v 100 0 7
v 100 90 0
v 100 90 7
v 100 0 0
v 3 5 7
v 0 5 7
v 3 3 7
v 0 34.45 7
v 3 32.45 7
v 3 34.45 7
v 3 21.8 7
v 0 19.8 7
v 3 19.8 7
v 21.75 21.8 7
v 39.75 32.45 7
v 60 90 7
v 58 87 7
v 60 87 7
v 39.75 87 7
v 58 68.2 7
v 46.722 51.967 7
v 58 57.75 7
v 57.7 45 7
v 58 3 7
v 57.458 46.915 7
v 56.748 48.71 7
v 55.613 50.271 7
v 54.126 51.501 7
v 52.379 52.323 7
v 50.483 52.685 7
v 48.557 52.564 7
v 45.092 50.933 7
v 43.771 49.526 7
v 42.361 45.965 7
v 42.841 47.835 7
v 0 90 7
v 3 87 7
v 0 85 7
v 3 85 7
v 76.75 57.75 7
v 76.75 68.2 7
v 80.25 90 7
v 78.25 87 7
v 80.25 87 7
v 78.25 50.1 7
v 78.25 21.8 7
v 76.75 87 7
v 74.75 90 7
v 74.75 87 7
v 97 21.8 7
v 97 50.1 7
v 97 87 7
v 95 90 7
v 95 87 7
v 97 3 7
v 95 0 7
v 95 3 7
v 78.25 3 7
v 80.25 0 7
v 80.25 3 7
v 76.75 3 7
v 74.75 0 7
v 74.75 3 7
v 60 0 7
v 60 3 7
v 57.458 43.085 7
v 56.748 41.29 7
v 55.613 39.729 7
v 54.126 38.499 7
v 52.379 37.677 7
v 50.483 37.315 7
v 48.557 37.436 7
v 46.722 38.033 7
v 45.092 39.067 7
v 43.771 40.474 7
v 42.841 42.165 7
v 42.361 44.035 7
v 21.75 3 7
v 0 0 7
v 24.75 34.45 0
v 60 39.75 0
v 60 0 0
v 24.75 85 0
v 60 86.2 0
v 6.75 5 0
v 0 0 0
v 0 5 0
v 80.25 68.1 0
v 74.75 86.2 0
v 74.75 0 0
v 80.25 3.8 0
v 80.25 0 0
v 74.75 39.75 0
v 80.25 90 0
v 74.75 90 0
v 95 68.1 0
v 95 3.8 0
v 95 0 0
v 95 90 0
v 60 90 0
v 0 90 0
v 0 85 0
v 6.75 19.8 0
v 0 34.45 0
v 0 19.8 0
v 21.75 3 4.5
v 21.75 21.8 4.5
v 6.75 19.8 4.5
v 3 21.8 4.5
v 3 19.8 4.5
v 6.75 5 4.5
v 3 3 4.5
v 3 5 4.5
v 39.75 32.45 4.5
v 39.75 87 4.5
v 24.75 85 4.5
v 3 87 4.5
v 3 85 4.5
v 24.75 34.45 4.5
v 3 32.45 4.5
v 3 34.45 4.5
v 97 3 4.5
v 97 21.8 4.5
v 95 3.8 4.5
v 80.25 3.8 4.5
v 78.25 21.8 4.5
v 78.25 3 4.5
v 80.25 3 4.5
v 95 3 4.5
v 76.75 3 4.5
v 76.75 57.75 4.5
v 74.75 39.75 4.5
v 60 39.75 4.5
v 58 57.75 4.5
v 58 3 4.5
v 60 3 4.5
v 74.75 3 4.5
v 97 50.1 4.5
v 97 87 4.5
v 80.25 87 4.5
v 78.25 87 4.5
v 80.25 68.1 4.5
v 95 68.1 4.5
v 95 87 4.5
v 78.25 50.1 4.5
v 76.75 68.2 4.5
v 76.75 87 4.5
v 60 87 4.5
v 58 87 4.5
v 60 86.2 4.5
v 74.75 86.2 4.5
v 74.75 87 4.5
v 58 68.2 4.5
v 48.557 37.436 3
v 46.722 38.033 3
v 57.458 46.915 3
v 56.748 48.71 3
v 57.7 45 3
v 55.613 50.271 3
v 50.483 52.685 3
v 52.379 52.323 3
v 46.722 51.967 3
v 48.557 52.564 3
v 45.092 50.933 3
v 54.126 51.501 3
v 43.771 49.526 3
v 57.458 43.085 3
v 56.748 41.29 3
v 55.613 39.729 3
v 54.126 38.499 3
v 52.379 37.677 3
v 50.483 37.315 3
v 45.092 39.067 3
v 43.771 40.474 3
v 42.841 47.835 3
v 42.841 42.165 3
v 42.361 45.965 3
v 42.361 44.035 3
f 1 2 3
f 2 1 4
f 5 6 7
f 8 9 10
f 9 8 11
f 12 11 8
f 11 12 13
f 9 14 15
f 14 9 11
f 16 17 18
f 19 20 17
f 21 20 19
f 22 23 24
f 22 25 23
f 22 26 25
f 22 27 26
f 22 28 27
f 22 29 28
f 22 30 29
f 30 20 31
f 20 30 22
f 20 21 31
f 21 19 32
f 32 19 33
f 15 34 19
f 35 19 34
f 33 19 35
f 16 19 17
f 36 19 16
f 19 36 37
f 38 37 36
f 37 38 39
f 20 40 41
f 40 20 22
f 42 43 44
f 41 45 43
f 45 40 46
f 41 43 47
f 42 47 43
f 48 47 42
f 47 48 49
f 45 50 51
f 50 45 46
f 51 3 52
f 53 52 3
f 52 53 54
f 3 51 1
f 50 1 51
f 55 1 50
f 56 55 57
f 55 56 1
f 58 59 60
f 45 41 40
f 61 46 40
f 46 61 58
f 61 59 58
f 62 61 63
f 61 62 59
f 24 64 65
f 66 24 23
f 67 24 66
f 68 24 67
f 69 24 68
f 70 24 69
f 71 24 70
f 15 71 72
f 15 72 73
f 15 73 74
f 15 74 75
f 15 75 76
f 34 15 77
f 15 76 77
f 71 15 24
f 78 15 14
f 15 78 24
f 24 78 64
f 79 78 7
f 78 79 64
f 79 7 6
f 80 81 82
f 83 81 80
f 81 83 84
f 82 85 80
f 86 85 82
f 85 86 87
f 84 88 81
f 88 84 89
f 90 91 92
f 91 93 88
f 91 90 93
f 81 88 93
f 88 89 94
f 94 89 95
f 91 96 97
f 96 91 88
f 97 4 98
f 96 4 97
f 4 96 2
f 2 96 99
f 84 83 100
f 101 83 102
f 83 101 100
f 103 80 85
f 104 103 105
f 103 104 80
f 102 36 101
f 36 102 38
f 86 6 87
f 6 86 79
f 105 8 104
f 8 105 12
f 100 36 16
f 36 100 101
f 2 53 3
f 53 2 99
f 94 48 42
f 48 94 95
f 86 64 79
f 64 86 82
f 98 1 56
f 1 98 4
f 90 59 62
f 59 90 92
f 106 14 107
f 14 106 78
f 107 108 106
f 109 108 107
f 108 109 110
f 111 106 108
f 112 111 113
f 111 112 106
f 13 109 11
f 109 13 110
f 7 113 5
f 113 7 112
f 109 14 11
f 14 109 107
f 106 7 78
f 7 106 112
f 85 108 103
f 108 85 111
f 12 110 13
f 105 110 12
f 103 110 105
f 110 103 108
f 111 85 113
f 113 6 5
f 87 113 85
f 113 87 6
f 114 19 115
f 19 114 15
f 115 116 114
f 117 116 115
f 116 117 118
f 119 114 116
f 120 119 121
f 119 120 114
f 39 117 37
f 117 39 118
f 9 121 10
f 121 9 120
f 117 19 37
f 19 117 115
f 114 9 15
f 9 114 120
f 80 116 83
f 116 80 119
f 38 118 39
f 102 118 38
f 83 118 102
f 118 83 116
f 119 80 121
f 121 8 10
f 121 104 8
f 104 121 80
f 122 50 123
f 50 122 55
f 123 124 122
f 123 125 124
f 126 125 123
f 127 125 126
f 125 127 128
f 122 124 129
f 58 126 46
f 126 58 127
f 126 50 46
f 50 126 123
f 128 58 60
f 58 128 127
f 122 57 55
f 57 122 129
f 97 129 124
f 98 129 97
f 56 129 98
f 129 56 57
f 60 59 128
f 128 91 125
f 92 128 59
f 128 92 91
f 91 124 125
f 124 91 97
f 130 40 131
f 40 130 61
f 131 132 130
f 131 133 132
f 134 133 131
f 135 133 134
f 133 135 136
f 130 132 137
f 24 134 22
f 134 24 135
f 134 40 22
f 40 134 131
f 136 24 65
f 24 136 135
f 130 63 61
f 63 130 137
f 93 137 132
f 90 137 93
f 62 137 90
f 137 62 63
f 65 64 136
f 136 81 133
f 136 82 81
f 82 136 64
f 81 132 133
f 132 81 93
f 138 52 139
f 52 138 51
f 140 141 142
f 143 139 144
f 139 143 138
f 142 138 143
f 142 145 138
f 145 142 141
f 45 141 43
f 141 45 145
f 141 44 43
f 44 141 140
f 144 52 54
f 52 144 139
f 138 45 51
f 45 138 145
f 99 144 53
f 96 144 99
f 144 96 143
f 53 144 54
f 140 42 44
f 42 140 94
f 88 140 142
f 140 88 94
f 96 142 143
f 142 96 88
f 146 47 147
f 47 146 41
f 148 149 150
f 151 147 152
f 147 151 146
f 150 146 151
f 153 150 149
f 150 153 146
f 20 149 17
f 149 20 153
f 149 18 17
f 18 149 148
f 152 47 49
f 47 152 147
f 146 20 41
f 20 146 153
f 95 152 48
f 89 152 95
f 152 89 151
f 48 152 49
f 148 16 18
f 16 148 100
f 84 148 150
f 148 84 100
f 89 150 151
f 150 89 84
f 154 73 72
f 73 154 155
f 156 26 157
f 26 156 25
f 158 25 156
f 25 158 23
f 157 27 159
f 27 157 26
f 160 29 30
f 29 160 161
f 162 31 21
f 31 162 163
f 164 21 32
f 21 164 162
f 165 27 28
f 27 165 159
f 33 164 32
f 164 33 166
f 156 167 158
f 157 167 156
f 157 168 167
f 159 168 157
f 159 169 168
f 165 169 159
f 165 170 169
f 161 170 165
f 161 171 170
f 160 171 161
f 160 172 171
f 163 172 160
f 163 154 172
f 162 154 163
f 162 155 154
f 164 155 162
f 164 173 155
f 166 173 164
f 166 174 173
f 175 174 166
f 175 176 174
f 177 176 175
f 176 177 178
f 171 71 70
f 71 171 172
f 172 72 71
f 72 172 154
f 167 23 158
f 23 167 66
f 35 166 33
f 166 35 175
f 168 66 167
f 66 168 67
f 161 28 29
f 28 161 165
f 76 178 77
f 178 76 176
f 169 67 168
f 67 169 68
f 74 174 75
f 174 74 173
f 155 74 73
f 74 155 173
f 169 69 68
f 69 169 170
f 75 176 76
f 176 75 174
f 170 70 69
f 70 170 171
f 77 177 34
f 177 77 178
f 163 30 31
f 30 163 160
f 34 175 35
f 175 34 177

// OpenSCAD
length = 100;
width = 90;
height = 7;

//Based on magnet size:
magnetBaseOuterDiameter = 20;
magnetBaseInnerDiameter = 15.4;

magnetHeight = 4.0;

billboardOneByOneTokenWidth = 18.05 + .75;
billboardOneByOneTokenLength = 18.00 + .75;
billboardOneByOneTokenHeight = 1.75 + .75;

billboardTwoByOneTokenWidth = 36.15 + .75;
billboardTwoByOneTokenLength = 18.00 + .75;
billboardTwoByOneTokenHeight = 1.75 + .75;

billboardThreeByOneTokenWidth = 54.0 + .75;
billboardThreeByOneTokenLength = 18.0  + .75;
billboardThreeByOneTokenHeight = 1.75 + .75;

billboardThreeByTwoTokenWidth = 53.8 + .75;
billboardThreeByTwoTokenLength = 36.00 + .75;
billboardThreeByTwoTokenHeight = 1.75 + .75;

squareLipWidthRemainder = 4;
squareLipLengthRemainder = 15;

spaceBetweenSquares = 1.5;


wallThickness = 3;

difference(){
    cube([length, width, height]);

    translate([wallThickness, wallThickness, height - billboardOneByOneTokenHeight])
        cube([billboardOneByOneTokenLength,billboardOneByOneTokenWidth, billboardOneByOneTokenHeight]);
    translate([
        0,
       wallThickness + squareLipWidthRemainder/2,
        0])
        cube([
            billboardOneByOneTokenLength + wallThickness - squareLipLengthRemainder,
            billboardOneByOneTokenWidth - squareLipWidthRemainder,
            height]);
    
     
    translate([wallThickness, width - (billboardThreeByTwoTokenWidth + wallThickness), height - billboardThreeByTwoTokenHeight])
        cube([billboardThreeByTwoTokenLength,billboardThreeByTwoTokenWidth, billboardThreeByTwoTokenHeight]);
    translate([
        0,
        width - (billboardThreeByTwoTokenWidth + wallThickness) + squareLipWidthRemainder/2,
        0])
        cube([
            billboardThreeByTwoTokenLength + wallThickness - squareLipLengthRemainder,
            billboardThreeByTwoTokenWidth - squareLipWidthRemainder,
            height]);
            
            
            
            
            
            
    translate([length - (wallThickness + billboardOneByOneTokenLength), wallThickness, height - billboardOneByOneTokenHeight])
        cube([billboardOneByOneTokenLength,billboardOneByOneTokenWidth, billboardOneByOneTokenHeight]);
    translate([
        length - (wallThickness + billboardOneByOneTokenLength - squareLipWidthRemainder/2),
        0,
        0])
        cube([
            billboardOneByOneTokenLength - squareLipWidthRemainder,
            billboardOneByOneTokenWidth - squareLipLengthRemainder,
            height]);
            
    translate([length - (wallThickness + billboardThreeByOneTokenLength + spaceBetweenSquares + billboardTwoByOneTokenLength) , wallThickness, height - billboardThreeByOneTokenHeight])
        cube([billboardThreeByOneTokenLength,billboardThreeByOneTokenWidth, billboardThreeByOneTokenHeight]);
    translate([
        length - (wallThickness + billboardThreeByOneTokenLength + spaceBetweenSquares + billboardTwoByOneTokenLength - squareLipWidthRemainder/2),
        0,
        0])
        cube([
            billboardThreeByOneTokenLength - squareLipWidthRemainder,
             billboardThreeByOneTokenWidth - squareLipLengthRemainder ,
            height]);




    
    translate([length - (wallThickness + billboardTwoByOneTokenLength) , width - (wallThickness + billboardTwoByOneTokenWidth), height - billboardTwoByOneTokenHeight])
        cube([billboardTwoByOneTokenLength,billboardTwoByOneTokenWidth, billboardTwoByOneTokenHeight]);
    translate([
        length - (wallThickness + billboardTwoByOneTokenLength - squareLipWidthRemainder/2),
        width - (billboardTwoByOneTokenWidth - squareLipLengthRemainder),
        0])
        cube([
            billboardTwoByOneTokenLength - squareLipWidthRemainder,
            billboardTwoByOneTokenWidth - squareLipLengthRemainder,
            height]);
            
     translate([length - (wallThickness + billboardOneByOneTokenLength + billboardOneByOneTokenLength + spaceBetweenSquares) , width - (wallThickness + billboardOneByOneTokenWidth), height - billboardOneByOneTokenHeight])
        cube([billboardOneByOneTokenLength,billboardOneByOneTokenWidth, billboardOneByOneTokenHeight]);
    translate([
        length - (wallThickness + billboardOneByOneTokenLength * 2 + spaceBetweenSquares - squareLipWidthRemainder/2),
        width - (billboardOneByOneTokenWidth - squareLipLengthRemainder),
        0])
        cube([
            billboardOneByOneTokenLength - squareLipWidthRemainder,
            billboardOneByOneTokenWidth - squareLipLengthRemainder,
            height]);
    
    
        
   
            
    
        
    translate([length/2, width/2, height - magnetHeight])
        cylinder(magnetHeight, d=magnetBaseInnerDiameter);
        

}
